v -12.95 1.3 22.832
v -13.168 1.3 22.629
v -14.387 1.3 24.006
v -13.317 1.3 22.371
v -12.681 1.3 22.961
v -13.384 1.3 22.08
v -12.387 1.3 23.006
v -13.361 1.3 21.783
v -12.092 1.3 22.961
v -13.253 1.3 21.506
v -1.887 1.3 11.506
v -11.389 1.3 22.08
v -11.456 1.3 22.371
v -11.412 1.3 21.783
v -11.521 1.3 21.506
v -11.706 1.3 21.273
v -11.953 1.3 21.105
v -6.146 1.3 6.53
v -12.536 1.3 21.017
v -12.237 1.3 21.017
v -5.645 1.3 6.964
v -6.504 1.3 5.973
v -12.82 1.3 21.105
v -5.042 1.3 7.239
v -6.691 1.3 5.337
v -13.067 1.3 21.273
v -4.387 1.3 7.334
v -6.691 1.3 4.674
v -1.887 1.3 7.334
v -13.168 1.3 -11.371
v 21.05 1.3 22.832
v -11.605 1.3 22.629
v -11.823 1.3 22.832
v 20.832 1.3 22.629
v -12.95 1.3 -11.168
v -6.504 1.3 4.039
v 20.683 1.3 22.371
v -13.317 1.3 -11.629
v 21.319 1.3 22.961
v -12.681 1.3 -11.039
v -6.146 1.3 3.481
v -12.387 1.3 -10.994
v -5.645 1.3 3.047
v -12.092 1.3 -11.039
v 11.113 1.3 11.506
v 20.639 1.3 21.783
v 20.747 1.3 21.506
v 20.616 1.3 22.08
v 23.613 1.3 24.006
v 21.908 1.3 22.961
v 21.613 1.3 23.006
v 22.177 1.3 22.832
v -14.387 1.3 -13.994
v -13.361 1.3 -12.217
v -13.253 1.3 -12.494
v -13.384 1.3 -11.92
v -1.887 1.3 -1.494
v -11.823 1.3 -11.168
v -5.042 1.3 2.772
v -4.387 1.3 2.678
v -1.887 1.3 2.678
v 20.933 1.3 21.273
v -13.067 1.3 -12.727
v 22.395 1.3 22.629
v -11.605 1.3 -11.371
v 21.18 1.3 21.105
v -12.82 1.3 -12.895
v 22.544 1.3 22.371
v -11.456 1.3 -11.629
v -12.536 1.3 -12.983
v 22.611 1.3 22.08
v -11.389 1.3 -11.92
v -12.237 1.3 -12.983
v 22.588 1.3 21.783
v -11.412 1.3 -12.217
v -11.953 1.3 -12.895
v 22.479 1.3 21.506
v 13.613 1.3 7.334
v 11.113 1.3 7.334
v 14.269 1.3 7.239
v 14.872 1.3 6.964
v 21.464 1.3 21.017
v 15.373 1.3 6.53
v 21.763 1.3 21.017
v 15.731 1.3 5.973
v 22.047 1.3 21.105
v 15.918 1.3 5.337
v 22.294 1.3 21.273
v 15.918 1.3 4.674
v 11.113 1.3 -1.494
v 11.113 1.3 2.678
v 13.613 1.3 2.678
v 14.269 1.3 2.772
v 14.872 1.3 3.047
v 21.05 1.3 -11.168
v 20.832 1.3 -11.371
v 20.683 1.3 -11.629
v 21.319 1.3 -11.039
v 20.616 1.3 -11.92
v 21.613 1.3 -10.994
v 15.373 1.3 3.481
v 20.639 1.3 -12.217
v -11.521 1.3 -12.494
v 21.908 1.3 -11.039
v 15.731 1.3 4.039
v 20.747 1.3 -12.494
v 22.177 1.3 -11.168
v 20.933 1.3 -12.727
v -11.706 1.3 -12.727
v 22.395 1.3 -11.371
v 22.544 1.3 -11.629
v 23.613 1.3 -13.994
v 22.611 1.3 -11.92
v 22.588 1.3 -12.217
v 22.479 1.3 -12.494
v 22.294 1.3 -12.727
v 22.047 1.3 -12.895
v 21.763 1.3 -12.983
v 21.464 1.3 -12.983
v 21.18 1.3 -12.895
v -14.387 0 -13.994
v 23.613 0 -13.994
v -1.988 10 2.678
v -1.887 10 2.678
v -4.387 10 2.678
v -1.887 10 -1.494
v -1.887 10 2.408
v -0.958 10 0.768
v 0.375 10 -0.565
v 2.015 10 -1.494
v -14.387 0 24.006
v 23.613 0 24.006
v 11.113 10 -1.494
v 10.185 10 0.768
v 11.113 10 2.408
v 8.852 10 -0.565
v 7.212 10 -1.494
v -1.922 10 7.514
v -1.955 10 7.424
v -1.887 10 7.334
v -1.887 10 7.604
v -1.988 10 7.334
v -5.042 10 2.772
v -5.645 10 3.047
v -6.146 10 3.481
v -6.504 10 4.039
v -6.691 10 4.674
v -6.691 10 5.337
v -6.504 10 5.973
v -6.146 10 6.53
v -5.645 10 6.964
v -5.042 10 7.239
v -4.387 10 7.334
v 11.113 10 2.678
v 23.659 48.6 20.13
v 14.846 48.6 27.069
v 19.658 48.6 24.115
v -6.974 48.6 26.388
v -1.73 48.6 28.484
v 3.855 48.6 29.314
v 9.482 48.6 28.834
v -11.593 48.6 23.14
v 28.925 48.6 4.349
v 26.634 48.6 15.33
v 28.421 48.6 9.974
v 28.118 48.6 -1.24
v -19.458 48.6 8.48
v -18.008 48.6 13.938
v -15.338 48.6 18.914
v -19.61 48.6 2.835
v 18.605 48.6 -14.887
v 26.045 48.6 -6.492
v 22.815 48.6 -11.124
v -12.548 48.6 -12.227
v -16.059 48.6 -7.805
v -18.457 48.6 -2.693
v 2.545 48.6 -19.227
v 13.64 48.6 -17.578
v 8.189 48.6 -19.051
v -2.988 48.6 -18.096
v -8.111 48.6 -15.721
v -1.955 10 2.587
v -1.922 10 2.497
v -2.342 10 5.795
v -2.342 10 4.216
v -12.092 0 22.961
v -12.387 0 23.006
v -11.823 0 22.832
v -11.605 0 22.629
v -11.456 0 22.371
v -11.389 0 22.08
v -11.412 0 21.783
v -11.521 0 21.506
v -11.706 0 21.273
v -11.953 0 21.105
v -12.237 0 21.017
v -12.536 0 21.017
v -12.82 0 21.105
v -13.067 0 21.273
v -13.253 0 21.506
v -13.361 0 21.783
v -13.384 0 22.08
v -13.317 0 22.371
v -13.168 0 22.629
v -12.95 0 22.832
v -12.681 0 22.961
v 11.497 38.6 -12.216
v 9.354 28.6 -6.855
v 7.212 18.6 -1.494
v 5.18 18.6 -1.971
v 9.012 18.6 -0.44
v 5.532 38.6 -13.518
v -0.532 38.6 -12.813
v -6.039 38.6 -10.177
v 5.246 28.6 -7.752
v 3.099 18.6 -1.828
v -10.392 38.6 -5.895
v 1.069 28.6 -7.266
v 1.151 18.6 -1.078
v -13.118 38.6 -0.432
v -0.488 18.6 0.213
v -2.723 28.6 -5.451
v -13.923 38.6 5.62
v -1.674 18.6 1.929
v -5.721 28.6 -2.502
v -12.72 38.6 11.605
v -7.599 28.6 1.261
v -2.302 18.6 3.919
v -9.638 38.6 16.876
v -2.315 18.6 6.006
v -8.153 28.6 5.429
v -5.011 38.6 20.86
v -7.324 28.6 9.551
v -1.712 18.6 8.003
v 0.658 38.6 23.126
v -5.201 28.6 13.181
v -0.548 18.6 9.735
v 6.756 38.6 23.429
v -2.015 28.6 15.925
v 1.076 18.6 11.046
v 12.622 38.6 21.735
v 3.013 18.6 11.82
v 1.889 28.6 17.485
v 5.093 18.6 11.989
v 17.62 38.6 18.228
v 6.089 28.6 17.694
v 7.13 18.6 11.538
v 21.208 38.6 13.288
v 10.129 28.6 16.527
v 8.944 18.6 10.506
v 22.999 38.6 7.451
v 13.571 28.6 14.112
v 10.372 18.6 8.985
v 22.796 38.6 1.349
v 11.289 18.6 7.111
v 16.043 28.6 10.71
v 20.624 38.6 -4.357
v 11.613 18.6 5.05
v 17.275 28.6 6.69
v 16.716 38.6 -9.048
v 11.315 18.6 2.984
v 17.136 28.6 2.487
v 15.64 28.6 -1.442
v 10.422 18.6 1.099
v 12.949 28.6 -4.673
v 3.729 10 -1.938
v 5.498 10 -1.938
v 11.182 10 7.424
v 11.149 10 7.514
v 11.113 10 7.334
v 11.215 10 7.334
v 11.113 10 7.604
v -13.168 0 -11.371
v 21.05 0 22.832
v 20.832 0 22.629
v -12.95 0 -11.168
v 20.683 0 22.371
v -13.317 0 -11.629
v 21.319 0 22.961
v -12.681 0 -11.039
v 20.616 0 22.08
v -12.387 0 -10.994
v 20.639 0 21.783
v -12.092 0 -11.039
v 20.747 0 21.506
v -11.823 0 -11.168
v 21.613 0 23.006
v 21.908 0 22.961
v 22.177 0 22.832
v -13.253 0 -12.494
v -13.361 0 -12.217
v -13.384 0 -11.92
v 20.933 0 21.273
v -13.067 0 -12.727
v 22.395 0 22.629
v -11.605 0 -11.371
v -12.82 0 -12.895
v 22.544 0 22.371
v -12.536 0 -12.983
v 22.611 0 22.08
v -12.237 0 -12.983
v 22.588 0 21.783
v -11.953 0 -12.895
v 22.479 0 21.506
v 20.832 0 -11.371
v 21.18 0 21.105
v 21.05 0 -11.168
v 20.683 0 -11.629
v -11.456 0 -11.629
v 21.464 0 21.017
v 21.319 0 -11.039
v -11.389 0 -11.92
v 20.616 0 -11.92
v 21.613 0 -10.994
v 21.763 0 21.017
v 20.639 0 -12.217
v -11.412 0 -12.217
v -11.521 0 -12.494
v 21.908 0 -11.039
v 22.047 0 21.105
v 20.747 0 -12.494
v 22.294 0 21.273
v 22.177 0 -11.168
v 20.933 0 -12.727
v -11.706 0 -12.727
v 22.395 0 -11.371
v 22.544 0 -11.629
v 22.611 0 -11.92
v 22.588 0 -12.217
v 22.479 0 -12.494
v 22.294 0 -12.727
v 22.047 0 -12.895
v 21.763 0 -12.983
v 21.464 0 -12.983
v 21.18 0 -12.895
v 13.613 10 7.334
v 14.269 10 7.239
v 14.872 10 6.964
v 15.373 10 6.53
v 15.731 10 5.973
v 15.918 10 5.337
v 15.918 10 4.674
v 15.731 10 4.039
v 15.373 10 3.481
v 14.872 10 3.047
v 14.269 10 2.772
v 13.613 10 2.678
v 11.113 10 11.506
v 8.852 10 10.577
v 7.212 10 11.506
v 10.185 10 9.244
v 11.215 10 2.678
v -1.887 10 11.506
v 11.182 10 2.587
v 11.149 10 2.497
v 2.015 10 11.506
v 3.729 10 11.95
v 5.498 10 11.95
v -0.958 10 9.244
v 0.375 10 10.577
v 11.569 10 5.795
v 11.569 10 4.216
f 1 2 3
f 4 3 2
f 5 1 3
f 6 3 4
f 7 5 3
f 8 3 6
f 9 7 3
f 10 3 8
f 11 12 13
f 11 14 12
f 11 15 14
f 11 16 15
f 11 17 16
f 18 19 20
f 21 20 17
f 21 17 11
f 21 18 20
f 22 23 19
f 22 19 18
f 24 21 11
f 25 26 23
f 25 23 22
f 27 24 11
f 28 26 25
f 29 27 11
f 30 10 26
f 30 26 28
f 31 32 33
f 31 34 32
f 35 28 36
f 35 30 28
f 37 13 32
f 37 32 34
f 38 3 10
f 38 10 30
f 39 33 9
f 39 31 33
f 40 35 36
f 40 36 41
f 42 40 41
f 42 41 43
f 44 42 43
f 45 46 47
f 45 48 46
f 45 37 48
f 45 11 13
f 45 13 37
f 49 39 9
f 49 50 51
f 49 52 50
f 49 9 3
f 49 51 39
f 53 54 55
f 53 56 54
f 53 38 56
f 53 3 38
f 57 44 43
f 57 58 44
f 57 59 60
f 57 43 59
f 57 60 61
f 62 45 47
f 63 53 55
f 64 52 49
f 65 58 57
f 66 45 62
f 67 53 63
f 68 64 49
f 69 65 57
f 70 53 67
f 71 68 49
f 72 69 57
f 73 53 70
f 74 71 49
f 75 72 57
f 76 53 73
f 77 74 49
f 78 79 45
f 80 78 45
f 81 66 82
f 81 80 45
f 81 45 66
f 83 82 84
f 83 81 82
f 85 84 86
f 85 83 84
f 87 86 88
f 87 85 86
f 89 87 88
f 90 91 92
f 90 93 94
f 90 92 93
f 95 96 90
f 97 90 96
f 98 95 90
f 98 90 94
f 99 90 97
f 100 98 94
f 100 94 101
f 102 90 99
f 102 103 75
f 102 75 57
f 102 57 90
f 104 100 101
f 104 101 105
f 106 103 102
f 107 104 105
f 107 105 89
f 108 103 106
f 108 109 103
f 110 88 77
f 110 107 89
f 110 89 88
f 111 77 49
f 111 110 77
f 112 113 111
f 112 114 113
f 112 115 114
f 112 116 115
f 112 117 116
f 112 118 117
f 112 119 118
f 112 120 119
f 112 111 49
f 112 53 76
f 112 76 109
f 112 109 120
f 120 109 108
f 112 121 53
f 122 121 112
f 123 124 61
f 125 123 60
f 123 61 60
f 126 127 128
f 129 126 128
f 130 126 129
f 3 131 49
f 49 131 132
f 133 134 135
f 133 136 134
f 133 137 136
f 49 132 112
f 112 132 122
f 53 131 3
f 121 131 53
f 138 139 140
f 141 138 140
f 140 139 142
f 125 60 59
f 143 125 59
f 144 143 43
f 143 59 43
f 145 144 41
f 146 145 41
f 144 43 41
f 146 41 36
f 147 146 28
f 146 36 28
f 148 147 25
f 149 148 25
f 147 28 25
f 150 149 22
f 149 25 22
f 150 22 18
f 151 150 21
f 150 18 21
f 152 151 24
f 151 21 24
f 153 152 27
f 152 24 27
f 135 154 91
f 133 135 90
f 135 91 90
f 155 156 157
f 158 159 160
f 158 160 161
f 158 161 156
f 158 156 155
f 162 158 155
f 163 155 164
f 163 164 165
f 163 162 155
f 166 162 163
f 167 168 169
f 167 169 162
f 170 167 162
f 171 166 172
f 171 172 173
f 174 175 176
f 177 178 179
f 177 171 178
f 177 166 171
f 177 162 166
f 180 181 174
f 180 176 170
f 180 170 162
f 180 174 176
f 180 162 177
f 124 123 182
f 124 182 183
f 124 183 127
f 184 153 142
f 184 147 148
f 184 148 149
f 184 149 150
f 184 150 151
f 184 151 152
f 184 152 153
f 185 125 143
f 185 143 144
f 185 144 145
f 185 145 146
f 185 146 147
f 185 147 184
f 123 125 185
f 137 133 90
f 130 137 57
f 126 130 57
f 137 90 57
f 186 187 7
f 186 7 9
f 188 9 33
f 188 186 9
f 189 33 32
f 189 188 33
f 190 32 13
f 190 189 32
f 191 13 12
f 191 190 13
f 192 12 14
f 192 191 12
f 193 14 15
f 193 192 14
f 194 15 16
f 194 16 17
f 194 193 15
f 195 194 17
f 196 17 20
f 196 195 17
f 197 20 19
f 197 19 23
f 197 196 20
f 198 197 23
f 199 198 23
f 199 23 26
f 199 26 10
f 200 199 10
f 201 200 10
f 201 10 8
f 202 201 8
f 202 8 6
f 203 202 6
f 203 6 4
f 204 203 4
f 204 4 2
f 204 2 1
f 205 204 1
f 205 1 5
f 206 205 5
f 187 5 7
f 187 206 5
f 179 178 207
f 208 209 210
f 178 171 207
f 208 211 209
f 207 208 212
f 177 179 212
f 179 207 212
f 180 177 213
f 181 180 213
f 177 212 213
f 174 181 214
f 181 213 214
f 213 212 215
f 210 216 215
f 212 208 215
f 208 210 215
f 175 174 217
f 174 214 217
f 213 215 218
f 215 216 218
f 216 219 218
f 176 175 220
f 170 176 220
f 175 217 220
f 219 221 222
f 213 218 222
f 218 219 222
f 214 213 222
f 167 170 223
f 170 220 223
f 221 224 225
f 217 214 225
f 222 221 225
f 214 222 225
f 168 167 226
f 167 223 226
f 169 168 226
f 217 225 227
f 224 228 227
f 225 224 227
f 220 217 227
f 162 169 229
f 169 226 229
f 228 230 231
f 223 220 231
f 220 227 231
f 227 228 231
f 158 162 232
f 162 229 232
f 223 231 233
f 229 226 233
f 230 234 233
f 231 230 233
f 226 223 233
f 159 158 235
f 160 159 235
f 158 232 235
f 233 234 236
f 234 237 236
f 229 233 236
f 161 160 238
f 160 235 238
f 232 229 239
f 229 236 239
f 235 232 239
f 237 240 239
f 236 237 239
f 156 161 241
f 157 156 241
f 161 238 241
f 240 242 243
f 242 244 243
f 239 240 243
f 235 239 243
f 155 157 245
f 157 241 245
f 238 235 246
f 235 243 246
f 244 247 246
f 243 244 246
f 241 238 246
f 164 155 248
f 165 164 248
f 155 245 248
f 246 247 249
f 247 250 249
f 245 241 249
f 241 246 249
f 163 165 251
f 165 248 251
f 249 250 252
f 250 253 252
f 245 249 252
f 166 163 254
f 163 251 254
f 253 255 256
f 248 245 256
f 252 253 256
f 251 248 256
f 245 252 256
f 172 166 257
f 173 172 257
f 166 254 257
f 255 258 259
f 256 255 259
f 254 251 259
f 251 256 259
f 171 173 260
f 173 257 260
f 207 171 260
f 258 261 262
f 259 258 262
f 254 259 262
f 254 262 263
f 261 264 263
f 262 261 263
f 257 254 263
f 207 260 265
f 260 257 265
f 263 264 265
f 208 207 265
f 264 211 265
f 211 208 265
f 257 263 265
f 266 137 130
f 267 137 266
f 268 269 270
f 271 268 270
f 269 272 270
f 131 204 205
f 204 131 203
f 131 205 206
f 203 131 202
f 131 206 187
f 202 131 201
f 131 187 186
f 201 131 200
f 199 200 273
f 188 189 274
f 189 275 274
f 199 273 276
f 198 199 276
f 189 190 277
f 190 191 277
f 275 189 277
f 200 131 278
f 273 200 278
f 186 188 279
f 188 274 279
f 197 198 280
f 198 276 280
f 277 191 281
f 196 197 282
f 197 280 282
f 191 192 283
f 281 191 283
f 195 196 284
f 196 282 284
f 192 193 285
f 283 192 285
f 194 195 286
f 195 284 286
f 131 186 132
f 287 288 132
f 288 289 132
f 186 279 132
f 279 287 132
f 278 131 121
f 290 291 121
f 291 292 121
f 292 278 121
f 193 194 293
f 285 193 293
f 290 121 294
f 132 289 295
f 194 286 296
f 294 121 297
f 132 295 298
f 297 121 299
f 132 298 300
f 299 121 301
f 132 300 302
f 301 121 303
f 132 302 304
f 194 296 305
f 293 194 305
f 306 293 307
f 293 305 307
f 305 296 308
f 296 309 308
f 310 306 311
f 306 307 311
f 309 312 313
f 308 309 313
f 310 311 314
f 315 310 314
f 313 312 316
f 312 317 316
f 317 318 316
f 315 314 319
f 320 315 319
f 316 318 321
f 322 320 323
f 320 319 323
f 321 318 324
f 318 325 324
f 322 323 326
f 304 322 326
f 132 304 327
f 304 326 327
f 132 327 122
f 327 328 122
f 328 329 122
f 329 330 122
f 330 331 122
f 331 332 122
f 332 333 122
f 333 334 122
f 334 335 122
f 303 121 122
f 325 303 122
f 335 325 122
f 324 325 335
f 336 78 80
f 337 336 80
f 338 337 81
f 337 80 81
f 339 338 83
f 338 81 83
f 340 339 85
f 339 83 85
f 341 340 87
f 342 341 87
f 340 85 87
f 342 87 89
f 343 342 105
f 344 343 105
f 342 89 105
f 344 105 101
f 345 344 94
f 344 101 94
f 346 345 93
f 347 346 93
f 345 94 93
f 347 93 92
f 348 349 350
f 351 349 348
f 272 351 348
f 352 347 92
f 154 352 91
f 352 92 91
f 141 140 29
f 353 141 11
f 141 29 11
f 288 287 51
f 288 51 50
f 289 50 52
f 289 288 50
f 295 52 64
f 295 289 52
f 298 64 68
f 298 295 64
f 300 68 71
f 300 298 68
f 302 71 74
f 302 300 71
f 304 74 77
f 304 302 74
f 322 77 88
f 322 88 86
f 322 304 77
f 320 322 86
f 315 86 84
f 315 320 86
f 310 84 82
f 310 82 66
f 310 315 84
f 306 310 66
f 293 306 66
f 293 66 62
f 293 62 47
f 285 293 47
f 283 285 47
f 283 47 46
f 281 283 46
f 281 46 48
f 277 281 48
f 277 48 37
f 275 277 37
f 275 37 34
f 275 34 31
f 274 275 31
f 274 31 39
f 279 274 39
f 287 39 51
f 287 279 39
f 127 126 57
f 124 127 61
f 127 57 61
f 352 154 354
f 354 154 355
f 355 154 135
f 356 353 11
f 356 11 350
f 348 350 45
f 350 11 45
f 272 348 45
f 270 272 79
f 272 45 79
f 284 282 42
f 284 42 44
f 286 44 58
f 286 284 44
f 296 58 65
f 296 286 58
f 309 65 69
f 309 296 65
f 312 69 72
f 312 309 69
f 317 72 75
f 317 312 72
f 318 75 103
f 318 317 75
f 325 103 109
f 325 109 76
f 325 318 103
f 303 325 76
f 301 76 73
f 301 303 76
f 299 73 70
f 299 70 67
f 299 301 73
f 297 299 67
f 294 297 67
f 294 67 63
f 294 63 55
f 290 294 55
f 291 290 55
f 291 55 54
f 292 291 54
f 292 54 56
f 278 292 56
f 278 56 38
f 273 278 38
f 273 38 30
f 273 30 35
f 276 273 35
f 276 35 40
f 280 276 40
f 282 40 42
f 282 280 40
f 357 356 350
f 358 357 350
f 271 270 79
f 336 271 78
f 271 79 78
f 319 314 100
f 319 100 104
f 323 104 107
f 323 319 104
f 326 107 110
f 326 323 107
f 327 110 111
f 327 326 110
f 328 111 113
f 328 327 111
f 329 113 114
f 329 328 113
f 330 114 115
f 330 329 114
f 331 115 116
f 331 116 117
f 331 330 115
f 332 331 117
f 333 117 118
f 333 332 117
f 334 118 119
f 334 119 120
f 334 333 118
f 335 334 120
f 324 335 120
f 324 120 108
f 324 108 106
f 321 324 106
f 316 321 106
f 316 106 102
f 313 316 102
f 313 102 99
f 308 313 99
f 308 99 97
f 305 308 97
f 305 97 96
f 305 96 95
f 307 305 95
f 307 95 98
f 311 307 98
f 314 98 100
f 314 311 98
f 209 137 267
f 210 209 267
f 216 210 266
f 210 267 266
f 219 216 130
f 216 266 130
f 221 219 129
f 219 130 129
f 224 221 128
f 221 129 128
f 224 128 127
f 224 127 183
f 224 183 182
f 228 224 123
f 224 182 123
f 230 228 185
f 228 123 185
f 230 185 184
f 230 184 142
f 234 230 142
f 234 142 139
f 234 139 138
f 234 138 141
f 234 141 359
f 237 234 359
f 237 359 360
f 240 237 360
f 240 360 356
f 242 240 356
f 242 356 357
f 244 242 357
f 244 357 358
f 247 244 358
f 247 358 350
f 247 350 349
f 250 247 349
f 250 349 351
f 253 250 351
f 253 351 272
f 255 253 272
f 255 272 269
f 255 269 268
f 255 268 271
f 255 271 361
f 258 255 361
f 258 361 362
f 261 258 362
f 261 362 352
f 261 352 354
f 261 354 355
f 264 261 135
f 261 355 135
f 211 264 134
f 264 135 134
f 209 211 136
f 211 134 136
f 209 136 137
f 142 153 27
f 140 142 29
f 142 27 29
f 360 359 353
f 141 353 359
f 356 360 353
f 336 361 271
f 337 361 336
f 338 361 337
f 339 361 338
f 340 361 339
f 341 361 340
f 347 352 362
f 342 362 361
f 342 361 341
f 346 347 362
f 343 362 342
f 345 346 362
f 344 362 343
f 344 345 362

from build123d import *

# Parameters (mm, degrees)
SKETCH1_W           = 38
SKETCH1_H           = 38
SKETCH1_R           = 1
BOSS_EXTRUDE1_DEPTH = 1.3
BOSS_EXTRUDE2_DEPTH = 8.7
SKETCH3_R           = 7
BOSS_EXTRUDE3_DEPTH = 8.6
SKETCH4_R           = 7
BOSS_EXTRUDE4_DEPTH = 30
BOSS_EXTRUDE4_DRAFT = -30


with BuildPart() as part:
    # Sketch1 → Boss-Extrude1 (new body)
    with BuildSketch(Plane(origin=(0, 0, 0), x_dir=(1, 0, 0), z_dir=(0, 1, 0))):
        with Locations((4.613461538, -5.005769231)):
            Rectangle(SKETCH1_W, SKETCH1_H)
        with Locations((-12.386538462, 11.994230769)):
            Circle(SKETCH1_R, mode=Mode.SUBTRACT)
        with Locations((21.613461538, 11.994230769)):
            Circle(SKETCH1_R, mode=Mode.SUBTRACT)
        with Locations((21.613461538, -22.005769231)):
            Circle(SKETCH1_R, mode=Mode.SUBTRACT)
        with Locations((-12.386538462, -22.005769231)):
            Circle(SKETCH1_R, mode=Mode.SUBTRACT)
    extrude(amount=BOSS_EXTRUDE1_DEPTH)

    # Sketch2 → Boss-Extrude2 (add)
    with BuildSketch(Plane(origin=(0, 1.3, 0), x_dir=(1, 0, 0), z_dir=(0, 1, 0))):
        with BuildLine():
            Line((-1.886538462, -11.505769231), (11.113461538, -11.505769231))
            Line((11.113461538, -11.505769231), (11.113461538, -7.333742244))
            Line((11.113461538, -7.333742244), (13.613461538, -7.333742244))
            ThreePointArc((13.613461538, -7.333742244), (15.941434552, -5.005769231), (13.613461538, -2.677796217))
            Line((13.613461538, -2.677796217), (11.113461538, -2.677796217))
            Line((11.113461538, -2.677796217), (11.113461538, 1.494230769))
            Line((11.113461538, 1.494230769), (-1.886538462, 1.494230769))
            Line((-1.886538462, 1.494230769), (-1.886538462, -2.677796217))
            Line((-1.886538462, -2.677796217), (-4.386538462, -2.677796217))
            ThreePointArc((-4.386538462, -2.677796217), (-6.714511475, -5.005769231), (-4.386538462, -7.333742244))
            Line((-4.386538462, -7.333742244), (-1.886538462, -7.333742244))
            Line((-1.886538462, -7.333742244), (-1.886538462, -11.505769231))
        make_face()
    extrude(amount=BOSS_EXTRUDE2_DEPTH)

    # Sketch3 → Boss-Extrude3 (add)
    with BuildSketch(Plane(origin=(0, 10, 0), x_dir=(1, 0, 0), z_dir=(0, 1, 0))):
        with Locations((4.613461538, -5.005769231)):
            Circle(SKETCH3_R)
    extrude(amount=BOSS_EXTRUDE3_DEPTH)


with BuildPart() as boss_extrude4_tool:
    # Sketch4 → Boss-Extrude4 (with draft: the straight prism first)
    with BuildSketch(Plane(origin=(0, 18.6, 0), x_dir=(1, 0, 0), z_dir=(0, 1, 0))):
        with Locations((4.613461538, -5.005769231)):
            Circle(SKETCH4_R)
    extrude(amount=BOSS_EXTRUDE4_DEPTH)
    # Boss-Extrude4: the draft: its side faces are tilted about the plane it starts from
    boss_extrude4_sides = [boss_extrude4_tool.faces().sort_by_distance(p)[0] for p in [
        (-2.386538462, 33.6, 5.005769231),
    ]]
    draft(boss_extrude4_sides, Plane(origin=(0, 18.6, 0), x_dir=(1, 0, 0), z_dir=(0, 1, 0)), BOSS_EXTRUDE4_DRAFT)


with BuildPart() as part_1:
    add(part.part)

    # Boss-Extrude4: add boss_extrude4_tool
    add(boss_extrude4_tool.part)


solid = part_1.part
